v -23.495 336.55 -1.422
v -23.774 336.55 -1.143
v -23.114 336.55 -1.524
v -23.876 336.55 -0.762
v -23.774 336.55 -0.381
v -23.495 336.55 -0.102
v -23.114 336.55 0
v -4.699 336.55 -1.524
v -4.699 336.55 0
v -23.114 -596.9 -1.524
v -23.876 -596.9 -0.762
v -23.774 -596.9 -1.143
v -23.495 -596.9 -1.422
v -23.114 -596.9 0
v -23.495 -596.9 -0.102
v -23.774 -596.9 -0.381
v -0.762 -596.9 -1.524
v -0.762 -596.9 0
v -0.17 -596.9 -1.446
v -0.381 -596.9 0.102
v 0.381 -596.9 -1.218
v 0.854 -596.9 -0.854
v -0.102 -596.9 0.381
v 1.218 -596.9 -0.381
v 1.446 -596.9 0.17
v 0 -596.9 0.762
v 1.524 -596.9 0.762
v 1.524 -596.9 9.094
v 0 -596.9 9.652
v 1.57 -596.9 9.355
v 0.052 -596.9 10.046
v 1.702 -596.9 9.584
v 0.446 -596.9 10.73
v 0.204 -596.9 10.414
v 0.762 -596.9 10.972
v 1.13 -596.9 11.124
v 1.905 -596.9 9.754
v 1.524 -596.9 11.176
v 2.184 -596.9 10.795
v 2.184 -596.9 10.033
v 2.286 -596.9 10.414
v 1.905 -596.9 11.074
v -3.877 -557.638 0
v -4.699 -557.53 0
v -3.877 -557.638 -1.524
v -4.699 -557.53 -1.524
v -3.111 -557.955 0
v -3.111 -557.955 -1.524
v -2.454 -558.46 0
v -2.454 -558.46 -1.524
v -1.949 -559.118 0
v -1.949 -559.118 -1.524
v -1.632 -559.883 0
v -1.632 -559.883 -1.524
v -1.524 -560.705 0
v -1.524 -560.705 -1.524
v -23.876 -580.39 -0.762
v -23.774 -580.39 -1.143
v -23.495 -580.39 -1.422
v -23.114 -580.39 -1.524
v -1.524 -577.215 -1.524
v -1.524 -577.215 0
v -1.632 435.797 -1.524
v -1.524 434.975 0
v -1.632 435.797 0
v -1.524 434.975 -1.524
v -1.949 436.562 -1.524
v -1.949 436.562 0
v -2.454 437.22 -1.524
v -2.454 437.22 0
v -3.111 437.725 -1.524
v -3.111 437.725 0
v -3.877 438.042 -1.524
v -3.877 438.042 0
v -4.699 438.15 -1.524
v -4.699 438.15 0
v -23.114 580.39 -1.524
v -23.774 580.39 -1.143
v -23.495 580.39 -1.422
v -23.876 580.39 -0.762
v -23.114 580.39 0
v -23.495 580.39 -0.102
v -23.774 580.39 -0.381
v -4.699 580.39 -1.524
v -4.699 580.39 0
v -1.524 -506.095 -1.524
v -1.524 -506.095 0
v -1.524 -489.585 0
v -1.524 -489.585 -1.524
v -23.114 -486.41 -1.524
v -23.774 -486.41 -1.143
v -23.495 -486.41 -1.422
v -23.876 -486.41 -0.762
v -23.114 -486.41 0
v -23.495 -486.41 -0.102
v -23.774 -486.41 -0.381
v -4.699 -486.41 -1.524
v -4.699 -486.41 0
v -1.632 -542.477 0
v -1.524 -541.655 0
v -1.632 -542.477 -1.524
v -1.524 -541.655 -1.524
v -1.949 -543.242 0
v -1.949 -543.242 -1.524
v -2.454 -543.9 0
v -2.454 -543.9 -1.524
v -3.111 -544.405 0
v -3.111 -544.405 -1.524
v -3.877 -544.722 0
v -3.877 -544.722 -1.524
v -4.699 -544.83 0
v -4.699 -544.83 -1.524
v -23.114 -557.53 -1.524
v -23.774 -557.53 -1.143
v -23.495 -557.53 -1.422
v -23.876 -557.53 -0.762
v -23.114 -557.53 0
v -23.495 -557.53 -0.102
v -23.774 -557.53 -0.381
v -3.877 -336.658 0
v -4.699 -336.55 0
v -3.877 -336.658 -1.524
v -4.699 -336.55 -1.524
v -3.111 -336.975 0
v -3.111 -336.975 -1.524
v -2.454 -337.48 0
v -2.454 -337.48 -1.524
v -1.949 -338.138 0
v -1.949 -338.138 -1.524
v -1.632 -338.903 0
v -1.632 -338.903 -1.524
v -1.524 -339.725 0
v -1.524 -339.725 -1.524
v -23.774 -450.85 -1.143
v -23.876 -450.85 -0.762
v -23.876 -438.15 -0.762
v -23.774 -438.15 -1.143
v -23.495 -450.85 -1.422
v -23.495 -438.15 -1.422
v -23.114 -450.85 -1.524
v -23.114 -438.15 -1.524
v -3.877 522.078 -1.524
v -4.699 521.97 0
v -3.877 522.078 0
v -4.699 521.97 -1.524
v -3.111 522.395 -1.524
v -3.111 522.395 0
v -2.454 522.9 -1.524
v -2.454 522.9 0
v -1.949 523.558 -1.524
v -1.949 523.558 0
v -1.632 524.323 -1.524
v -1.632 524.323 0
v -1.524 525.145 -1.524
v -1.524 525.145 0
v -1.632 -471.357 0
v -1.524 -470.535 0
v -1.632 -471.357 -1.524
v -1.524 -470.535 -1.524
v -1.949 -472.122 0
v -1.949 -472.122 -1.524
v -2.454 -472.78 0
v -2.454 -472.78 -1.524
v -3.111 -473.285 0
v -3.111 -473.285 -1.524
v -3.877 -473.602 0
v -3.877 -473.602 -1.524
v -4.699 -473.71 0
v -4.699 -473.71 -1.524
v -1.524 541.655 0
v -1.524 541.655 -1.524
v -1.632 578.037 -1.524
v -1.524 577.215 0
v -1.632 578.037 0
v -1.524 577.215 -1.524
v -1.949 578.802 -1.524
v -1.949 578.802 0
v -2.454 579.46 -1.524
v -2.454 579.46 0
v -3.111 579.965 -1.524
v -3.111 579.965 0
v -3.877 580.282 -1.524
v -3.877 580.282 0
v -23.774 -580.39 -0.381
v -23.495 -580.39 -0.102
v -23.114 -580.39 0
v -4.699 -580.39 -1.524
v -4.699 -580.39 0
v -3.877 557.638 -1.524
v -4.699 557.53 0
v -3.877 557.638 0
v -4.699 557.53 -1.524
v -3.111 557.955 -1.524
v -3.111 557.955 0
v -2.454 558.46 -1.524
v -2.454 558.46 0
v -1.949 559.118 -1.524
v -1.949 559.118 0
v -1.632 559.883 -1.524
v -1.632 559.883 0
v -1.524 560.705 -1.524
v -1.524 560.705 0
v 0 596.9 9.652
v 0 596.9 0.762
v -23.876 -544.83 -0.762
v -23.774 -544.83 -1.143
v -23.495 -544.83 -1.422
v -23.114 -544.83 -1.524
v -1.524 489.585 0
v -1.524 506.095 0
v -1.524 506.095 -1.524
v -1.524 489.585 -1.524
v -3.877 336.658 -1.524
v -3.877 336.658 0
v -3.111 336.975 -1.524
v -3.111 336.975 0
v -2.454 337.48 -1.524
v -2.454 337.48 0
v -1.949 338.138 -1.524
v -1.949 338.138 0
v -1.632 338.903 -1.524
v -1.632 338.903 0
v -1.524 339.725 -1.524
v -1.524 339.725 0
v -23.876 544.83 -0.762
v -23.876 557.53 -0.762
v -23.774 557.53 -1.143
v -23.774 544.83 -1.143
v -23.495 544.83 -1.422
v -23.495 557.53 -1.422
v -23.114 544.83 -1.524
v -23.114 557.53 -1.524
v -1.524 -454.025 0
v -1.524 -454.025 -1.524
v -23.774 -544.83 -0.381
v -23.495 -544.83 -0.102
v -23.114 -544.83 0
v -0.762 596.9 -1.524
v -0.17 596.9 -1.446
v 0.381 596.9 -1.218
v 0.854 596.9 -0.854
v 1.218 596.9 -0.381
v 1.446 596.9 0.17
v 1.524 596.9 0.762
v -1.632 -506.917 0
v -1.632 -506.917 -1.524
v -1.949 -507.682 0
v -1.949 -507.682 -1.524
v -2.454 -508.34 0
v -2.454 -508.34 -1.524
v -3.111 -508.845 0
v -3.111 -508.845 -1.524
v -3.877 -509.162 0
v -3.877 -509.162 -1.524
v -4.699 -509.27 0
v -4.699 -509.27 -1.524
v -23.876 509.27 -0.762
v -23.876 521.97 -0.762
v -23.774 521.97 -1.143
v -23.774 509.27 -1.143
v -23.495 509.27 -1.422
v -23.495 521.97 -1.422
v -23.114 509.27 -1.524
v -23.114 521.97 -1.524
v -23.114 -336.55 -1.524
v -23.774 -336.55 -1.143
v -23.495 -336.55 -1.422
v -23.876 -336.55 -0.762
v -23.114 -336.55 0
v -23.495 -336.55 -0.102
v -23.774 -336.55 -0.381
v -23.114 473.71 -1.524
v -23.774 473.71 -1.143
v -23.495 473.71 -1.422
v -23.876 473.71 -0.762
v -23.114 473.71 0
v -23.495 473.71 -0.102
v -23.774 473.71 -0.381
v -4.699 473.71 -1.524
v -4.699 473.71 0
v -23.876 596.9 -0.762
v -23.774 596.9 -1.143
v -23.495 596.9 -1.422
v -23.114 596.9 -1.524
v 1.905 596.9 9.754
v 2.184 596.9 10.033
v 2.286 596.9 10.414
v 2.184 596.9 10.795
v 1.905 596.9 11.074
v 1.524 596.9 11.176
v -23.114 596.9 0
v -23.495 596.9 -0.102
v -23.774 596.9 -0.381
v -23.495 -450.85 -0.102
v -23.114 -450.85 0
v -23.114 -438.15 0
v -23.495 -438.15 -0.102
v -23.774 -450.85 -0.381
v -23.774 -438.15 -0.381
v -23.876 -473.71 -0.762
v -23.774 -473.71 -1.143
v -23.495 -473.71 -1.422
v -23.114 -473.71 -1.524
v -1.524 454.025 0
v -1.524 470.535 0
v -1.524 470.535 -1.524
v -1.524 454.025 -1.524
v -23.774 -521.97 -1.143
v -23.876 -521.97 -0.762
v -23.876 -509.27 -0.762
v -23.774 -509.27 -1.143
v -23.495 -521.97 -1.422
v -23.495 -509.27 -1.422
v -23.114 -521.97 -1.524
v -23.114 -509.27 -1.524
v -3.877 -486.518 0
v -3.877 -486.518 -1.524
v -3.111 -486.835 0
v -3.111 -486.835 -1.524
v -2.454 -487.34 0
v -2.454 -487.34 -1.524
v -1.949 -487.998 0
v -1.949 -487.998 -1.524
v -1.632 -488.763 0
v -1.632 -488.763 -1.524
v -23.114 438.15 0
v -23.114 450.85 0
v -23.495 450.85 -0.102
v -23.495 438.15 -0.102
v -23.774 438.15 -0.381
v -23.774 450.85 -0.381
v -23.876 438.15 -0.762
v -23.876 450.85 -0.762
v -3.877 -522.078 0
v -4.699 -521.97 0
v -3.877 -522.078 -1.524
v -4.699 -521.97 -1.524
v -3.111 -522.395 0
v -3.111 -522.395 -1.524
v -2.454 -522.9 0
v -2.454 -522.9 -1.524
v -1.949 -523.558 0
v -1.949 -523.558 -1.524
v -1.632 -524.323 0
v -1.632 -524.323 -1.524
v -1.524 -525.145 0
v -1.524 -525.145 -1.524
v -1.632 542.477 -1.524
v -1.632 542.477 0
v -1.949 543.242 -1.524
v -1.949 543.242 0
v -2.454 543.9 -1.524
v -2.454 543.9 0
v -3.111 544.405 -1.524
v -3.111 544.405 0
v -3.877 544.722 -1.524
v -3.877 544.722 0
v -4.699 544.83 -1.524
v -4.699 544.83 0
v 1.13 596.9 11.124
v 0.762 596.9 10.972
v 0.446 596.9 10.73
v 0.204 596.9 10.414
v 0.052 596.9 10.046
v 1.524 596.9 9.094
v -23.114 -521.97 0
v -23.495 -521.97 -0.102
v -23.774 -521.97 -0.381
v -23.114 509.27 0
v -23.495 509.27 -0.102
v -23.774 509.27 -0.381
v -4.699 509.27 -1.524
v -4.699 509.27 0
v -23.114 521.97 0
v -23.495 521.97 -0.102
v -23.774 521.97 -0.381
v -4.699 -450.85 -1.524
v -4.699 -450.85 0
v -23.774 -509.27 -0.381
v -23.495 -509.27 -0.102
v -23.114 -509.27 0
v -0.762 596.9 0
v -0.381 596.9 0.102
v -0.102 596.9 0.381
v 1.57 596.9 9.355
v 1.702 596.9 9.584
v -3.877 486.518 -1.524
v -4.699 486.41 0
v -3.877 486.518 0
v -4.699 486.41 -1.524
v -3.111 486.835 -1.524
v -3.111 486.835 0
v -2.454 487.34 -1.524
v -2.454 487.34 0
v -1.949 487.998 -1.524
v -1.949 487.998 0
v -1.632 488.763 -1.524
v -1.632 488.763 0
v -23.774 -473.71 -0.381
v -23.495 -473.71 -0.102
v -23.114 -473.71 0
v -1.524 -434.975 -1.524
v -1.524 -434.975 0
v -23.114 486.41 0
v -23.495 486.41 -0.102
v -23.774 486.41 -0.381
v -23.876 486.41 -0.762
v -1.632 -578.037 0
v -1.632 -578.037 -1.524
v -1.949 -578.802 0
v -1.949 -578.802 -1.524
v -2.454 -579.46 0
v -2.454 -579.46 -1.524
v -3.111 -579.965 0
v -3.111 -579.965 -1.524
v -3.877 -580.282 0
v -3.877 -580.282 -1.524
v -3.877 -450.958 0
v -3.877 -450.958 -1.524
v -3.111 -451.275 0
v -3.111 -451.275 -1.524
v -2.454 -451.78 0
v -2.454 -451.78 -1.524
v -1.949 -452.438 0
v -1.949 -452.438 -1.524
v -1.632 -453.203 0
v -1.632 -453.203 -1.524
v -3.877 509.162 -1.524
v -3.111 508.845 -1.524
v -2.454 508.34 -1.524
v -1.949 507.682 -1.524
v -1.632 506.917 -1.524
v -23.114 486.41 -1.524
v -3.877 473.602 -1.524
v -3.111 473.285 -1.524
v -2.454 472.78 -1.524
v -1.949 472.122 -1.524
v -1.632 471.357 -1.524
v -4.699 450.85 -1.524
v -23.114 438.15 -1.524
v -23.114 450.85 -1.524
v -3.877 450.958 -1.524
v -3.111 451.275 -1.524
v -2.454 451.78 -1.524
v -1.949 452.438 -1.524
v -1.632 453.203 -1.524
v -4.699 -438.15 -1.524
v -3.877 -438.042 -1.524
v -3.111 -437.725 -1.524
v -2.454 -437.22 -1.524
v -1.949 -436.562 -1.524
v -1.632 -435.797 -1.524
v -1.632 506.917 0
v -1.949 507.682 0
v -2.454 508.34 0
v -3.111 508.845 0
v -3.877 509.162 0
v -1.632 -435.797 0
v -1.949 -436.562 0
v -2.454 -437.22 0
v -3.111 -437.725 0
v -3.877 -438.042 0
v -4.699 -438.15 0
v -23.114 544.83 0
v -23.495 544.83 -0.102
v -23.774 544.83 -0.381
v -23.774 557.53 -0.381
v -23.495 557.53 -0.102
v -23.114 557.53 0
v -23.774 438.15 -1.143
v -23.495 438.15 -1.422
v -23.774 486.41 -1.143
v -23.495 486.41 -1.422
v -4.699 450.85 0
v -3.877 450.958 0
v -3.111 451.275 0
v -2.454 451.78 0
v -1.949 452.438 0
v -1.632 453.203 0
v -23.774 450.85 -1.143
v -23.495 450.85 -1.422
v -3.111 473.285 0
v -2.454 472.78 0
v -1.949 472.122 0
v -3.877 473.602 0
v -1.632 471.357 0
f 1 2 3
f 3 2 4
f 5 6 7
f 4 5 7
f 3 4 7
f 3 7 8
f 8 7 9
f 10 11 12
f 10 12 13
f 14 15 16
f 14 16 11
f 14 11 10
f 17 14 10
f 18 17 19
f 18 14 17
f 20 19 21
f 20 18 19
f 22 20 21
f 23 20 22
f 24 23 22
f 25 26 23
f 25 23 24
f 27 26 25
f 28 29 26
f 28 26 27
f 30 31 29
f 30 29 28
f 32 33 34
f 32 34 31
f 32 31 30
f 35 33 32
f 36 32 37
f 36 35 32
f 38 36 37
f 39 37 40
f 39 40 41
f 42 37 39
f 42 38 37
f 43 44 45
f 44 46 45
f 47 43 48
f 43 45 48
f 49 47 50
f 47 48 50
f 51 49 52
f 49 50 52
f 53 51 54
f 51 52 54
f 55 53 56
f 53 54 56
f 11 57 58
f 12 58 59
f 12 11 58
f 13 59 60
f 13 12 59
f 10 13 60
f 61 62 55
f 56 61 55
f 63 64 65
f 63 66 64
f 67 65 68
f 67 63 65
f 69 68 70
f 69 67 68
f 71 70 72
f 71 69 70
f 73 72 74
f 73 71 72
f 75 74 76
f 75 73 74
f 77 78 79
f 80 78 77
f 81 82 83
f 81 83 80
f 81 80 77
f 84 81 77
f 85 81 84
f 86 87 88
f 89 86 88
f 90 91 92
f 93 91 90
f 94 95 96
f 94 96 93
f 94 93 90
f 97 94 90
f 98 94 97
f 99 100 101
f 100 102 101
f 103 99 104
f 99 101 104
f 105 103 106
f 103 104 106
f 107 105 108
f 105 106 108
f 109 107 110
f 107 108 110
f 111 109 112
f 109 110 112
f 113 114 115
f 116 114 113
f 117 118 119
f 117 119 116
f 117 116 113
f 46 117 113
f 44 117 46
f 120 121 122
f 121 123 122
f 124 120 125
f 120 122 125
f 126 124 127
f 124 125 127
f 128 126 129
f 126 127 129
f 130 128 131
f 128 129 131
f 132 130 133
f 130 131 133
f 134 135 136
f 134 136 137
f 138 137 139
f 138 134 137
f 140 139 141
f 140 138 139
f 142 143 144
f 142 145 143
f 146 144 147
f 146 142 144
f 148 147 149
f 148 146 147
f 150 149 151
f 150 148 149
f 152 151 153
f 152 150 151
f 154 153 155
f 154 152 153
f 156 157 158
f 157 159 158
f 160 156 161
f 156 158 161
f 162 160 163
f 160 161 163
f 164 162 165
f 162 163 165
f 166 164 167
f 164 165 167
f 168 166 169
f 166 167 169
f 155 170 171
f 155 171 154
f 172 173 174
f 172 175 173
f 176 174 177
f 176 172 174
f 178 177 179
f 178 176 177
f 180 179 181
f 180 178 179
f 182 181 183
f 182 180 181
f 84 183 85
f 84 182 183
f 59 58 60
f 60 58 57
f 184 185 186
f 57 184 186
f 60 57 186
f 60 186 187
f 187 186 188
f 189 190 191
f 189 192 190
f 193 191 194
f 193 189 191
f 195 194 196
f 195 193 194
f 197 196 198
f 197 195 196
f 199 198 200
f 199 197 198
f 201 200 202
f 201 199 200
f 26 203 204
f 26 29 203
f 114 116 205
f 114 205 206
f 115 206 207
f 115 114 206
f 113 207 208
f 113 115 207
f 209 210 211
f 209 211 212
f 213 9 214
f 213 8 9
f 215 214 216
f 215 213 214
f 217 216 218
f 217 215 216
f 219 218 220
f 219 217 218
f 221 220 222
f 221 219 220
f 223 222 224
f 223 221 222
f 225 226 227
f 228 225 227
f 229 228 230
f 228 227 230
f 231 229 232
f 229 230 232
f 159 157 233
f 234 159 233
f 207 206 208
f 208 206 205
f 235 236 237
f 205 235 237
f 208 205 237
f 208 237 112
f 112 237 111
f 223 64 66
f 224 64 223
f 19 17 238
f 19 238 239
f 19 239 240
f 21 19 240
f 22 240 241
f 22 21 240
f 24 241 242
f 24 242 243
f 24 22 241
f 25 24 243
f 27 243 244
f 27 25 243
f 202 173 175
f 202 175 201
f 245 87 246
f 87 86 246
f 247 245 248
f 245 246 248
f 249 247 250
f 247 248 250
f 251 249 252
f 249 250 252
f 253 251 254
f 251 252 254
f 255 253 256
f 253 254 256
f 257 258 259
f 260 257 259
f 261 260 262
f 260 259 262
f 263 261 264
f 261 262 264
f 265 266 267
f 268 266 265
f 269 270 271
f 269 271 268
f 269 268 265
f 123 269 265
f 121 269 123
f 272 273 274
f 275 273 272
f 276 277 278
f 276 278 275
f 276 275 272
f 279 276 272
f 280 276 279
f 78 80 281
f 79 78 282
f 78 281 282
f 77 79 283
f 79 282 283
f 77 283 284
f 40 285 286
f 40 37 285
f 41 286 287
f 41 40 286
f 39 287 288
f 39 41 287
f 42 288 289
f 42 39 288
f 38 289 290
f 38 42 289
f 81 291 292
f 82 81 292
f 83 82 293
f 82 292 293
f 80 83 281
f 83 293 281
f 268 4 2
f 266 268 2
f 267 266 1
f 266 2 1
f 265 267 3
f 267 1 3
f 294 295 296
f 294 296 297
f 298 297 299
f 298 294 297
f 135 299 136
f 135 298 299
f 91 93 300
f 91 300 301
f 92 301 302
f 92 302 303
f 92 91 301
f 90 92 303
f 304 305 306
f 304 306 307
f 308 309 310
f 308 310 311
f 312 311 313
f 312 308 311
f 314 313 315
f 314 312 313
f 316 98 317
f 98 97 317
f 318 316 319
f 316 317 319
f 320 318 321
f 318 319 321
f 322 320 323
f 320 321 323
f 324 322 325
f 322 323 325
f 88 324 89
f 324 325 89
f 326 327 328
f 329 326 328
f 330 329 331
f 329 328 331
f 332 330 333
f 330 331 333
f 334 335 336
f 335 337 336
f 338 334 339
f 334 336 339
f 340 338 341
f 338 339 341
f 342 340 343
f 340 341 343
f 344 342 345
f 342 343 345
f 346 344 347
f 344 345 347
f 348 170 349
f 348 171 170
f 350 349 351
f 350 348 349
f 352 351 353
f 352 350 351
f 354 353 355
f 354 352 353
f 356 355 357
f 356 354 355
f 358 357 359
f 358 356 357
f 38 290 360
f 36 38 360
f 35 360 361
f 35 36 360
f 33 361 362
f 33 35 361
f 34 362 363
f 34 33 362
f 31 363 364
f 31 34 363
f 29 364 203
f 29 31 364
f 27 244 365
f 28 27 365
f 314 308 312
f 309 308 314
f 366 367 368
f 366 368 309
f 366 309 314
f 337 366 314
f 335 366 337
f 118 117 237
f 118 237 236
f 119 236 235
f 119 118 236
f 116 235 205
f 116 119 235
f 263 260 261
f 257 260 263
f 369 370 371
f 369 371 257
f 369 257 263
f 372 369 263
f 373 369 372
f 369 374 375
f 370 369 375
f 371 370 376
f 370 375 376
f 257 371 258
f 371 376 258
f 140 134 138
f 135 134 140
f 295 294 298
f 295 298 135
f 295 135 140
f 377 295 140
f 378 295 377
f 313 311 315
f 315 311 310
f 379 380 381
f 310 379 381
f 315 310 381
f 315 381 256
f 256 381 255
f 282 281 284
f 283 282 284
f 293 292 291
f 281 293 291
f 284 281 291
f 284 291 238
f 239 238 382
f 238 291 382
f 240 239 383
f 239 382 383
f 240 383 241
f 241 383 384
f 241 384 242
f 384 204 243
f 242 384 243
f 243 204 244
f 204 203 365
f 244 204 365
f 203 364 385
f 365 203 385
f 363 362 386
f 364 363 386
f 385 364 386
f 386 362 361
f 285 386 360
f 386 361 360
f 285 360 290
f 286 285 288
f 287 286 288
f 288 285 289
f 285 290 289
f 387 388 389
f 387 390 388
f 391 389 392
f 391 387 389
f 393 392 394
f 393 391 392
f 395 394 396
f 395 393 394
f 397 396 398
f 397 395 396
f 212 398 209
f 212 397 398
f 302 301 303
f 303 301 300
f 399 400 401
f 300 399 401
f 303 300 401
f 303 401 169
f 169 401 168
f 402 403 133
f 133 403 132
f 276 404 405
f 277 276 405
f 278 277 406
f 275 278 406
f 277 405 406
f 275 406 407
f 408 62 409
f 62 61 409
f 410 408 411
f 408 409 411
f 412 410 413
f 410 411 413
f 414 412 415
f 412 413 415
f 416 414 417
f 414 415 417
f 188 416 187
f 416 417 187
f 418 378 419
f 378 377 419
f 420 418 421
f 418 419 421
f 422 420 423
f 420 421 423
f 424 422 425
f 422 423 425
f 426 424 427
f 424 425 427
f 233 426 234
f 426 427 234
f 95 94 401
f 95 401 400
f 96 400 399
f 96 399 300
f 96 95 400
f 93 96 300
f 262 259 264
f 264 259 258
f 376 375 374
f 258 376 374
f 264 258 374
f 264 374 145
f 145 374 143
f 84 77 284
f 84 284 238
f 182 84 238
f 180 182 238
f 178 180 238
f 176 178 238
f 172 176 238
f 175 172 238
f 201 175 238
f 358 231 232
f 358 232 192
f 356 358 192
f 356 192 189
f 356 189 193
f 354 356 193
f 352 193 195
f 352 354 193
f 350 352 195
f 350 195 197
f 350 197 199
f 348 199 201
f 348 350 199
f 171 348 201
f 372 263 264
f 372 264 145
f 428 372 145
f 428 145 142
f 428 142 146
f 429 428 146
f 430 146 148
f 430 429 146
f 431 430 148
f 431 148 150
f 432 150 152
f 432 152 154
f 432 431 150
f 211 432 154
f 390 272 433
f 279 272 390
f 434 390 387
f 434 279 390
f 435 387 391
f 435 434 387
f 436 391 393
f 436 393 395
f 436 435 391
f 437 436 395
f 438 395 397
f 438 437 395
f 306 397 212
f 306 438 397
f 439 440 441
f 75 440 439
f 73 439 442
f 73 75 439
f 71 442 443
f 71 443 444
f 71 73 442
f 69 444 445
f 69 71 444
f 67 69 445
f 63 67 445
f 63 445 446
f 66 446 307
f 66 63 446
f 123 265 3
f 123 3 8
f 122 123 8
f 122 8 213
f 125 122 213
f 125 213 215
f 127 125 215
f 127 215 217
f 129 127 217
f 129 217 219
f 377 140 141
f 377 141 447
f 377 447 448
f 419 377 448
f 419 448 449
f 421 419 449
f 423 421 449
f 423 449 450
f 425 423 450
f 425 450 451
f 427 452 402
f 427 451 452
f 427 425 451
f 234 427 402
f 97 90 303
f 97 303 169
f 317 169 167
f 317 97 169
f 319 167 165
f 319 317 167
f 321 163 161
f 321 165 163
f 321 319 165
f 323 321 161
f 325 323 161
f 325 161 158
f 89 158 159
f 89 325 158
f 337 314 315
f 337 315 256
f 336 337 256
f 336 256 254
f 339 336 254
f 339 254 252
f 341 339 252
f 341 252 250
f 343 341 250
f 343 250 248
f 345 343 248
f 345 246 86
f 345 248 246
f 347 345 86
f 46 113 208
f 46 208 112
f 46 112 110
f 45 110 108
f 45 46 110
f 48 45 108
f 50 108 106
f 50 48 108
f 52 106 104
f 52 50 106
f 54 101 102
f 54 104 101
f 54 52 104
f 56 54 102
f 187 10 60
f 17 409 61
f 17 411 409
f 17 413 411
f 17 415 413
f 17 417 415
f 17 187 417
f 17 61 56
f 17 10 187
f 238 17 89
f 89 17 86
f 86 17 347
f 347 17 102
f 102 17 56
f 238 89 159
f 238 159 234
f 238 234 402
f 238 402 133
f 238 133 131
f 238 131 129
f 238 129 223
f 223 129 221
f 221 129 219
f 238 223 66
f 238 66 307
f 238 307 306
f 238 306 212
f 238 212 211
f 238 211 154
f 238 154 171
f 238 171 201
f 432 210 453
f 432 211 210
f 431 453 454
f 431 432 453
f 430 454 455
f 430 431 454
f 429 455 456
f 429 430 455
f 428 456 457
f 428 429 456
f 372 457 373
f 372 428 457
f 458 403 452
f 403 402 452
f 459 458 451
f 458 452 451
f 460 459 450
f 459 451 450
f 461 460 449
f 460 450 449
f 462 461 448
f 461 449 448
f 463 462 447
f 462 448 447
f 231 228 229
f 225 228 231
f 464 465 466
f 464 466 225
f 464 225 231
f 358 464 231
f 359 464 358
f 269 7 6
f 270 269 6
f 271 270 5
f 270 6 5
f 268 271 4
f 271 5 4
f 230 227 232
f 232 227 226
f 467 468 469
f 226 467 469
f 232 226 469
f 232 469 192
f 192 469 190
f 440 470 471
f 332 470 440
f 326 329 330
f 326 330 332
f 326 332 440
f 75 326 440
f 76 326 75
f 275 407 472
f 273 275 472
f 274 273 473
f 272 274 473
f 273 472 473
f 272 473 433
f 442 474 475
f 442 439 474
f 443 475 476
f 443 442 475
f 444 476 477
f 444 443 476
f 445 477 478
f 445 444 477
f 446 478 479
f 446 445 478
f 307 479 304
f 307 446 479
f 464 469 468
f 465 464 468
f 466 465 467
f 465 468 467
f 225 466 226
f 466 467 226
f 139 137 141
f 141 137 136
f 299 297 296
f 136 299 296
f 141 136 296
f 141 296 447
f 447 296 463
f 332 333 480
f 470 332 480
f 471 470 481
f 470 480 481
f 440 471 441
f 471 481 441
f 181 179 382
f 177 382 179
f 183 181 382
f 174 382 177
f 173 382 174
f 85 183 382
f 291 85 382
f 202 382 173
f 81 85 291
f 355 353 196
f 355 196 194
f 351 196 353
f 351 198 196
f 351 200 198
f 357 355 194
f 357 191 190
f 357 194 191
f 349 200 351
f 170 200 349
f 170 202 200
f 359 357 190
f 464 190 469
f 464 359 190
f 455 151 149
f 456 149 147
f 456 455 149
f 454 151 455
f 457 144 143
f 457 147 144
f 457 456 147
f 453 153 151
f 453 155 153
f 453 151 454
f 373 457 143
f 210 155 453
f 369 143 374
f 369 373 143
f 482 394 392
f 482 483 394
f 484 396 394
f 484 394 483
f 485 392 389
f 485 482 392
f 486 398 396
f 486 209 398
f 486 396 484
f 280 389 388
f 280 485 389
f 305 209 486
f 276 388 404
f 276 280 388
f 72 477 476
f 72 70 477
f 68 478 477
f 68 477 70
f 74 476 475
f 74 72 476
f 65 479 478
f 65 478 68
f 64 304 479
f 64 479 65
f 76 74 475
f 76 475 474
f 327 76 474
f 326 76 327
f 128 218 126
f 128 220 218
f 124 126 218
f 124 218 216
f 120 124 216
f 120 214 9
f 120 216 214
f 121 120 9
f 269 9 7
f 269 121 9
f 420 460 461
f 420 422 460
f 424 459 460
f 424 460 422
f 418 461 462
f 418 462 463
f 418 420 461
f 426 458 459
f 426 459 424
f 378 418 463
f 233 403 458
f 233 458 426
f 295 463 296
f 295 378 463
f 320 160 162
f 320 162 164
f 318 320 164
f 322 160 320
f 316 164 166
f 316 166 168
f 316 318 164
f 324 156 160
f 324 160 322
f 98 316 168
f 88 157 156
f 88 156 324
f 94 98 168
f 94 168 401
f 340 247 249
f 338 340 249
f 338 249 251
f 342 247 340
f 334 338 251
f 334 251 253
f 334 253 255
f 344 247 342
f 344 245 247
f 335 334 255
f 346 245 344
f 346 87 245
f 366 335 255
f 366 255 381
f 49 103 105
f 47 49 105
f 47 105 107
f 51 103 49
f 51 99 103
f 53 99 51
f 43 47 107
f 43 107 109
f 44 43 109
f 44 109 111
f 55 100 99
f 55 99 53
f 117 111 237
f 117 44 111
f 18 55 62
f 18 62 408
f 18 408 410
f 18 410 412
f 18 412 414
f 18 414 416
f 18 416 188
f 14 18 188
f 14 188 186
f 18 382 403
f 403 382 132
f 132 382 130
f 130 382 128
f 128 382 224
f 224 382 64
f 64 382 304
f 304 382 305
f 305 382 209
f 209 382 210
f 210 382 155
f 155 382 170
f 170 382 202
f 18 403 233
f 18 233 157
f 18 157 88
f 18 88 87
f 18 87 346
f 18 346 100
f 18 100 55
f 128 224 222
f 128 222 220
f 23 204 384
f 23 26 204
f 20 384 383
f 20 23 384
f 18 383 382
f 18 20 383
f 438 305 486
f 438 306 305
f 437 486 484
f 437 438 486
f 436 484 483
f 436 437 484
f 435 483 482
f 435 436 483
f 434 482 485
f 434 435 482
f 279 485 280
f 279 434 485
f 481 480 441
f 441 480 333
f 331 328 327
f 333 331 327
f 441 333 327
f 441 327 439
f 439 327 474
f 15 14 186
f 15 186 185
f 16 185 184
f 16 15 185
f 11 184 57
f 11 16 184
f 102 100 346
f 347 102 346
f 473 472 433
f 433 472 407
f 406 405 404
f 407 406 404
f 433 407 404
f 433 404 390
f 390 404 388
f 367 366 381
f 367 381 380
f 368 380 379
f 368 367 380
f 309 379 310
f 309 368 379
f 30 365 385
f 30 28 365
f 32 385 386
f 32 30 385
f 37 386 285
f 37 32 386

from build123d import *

# Parameters (mm, degrees)
F1_DEPTH = 596.9
F2_R     = 0.76199
F3_W     = 50.8
F3_H     = 101.6
F4_DEPTH = 1.525
F5_W     = 50.8
F5_H     = 22.86
F6_DEPTH = 1.525
F7_R     = 3.175


# Not quite as in the source:
# - a fillet or chamfer is up to 0.001 mm smaller than in the source, because OpenCascade refuses the exact size


with BuildPart() as f1:
    # F0 (on Front) → F1 (new body)
    with BuildSketch(Plane.XZ):
        with BuildLine():
            Line((1.524, 0.762), (1.524, 9.0941772846))
            ThreePointArc((1.524, 9.0941772846), (1.6260886423, 9.4751772846), (1.905, 9.7540886423))
            ThreePointArc((1.905, 9.7540886423), (2.2600354796, 10.6112201124), (1.524, 11.176))
            ThreePointArc((1.524, 11.176), (0.4463692655, 10.7296307345), (0, 9.652))
            Line((0, 9.652), (0, 0.762))
            ThreePointArc((0, 0.762), (-0.2231846327, 0.2231846327), (-0.762, 0))
            Line((-0.762, 0), (-23.876, 0))
            Line((-23.876, 0), (-23.876, -1.524))
            Line((-23.876, -1.524), (-0.762, -1.524))
            ThreePointArc((-0.762, -1.524), (0.8544461018, -0.8544461018), (1.524, 0.762))
        make_face()
    extrude(amount=F1_DEPTH)

    # F2 (radius 0.762 in the source; OpenCascade refuses exactly that, so slightly less here)
    f2_edges = [f1.edges().sort_by_distance(p)[0] for p in [
        (-23.876, -298.45, 0),
        (-23.876, -298.45, -1.524),
    ]]
    fillet(f2_edges, radius=F2_R)

    # F3 (on Top) → F4 (cut, through all)
    with BuildSketch(Plane.XY):
        with Locations((-26.924, -387.35)):
            Rectangle(F3_W, F3_H)
    extrude(amount=-F4_DEPTH, mode=Mode.SUBTRACT)

    # F5 (on Top) → F6 (cut, through all)
    with BuildSketch(Plane.XY):
        with Locations((-26.924, -462.28)):
            Rectangle(F5_W, F5_H)
        with Locations((-26.924, -497.84)):
            Rectangle(F5_W, F5_H)
        with Locations((-26.924, -533.4)):
            Rectangle(F5_W, F5_H)
        with Locations((-26.924, -568.96)):
            Rectangle(F5_W, F5_H)
    extrude(amount=-F6_DEPTH, mode=Mode.SUBTRACT)

    # F7
    f7_edges = [f1.edges().sort_by_distance(p)[0] for p in [
        (-1.524, -336.55, -0.762),
        (-1.524, -438.15, -0.762),
        (-1.524, -450.85, -0.762),
        (-1.524, -473.71, -0.762),
        (-1.524, -509.27, -0.762),
        (-1.524, -544.83, -0.762),
        (-1.524, -580.39, -0.762),
        (-1.524, -486.41, -0.762),
        (-1.524, -521.97, -0.762),
        (-1.524, -557.53, -0.762),
    ]]
    fillet(f7_edges, radius=F7_R)

    # F8: F1 across plane


with BuildPart() as f1_1:
    add(f1.part)
    add(f1.part.mirror(Plane.XZ))


solid = f1_1.part
